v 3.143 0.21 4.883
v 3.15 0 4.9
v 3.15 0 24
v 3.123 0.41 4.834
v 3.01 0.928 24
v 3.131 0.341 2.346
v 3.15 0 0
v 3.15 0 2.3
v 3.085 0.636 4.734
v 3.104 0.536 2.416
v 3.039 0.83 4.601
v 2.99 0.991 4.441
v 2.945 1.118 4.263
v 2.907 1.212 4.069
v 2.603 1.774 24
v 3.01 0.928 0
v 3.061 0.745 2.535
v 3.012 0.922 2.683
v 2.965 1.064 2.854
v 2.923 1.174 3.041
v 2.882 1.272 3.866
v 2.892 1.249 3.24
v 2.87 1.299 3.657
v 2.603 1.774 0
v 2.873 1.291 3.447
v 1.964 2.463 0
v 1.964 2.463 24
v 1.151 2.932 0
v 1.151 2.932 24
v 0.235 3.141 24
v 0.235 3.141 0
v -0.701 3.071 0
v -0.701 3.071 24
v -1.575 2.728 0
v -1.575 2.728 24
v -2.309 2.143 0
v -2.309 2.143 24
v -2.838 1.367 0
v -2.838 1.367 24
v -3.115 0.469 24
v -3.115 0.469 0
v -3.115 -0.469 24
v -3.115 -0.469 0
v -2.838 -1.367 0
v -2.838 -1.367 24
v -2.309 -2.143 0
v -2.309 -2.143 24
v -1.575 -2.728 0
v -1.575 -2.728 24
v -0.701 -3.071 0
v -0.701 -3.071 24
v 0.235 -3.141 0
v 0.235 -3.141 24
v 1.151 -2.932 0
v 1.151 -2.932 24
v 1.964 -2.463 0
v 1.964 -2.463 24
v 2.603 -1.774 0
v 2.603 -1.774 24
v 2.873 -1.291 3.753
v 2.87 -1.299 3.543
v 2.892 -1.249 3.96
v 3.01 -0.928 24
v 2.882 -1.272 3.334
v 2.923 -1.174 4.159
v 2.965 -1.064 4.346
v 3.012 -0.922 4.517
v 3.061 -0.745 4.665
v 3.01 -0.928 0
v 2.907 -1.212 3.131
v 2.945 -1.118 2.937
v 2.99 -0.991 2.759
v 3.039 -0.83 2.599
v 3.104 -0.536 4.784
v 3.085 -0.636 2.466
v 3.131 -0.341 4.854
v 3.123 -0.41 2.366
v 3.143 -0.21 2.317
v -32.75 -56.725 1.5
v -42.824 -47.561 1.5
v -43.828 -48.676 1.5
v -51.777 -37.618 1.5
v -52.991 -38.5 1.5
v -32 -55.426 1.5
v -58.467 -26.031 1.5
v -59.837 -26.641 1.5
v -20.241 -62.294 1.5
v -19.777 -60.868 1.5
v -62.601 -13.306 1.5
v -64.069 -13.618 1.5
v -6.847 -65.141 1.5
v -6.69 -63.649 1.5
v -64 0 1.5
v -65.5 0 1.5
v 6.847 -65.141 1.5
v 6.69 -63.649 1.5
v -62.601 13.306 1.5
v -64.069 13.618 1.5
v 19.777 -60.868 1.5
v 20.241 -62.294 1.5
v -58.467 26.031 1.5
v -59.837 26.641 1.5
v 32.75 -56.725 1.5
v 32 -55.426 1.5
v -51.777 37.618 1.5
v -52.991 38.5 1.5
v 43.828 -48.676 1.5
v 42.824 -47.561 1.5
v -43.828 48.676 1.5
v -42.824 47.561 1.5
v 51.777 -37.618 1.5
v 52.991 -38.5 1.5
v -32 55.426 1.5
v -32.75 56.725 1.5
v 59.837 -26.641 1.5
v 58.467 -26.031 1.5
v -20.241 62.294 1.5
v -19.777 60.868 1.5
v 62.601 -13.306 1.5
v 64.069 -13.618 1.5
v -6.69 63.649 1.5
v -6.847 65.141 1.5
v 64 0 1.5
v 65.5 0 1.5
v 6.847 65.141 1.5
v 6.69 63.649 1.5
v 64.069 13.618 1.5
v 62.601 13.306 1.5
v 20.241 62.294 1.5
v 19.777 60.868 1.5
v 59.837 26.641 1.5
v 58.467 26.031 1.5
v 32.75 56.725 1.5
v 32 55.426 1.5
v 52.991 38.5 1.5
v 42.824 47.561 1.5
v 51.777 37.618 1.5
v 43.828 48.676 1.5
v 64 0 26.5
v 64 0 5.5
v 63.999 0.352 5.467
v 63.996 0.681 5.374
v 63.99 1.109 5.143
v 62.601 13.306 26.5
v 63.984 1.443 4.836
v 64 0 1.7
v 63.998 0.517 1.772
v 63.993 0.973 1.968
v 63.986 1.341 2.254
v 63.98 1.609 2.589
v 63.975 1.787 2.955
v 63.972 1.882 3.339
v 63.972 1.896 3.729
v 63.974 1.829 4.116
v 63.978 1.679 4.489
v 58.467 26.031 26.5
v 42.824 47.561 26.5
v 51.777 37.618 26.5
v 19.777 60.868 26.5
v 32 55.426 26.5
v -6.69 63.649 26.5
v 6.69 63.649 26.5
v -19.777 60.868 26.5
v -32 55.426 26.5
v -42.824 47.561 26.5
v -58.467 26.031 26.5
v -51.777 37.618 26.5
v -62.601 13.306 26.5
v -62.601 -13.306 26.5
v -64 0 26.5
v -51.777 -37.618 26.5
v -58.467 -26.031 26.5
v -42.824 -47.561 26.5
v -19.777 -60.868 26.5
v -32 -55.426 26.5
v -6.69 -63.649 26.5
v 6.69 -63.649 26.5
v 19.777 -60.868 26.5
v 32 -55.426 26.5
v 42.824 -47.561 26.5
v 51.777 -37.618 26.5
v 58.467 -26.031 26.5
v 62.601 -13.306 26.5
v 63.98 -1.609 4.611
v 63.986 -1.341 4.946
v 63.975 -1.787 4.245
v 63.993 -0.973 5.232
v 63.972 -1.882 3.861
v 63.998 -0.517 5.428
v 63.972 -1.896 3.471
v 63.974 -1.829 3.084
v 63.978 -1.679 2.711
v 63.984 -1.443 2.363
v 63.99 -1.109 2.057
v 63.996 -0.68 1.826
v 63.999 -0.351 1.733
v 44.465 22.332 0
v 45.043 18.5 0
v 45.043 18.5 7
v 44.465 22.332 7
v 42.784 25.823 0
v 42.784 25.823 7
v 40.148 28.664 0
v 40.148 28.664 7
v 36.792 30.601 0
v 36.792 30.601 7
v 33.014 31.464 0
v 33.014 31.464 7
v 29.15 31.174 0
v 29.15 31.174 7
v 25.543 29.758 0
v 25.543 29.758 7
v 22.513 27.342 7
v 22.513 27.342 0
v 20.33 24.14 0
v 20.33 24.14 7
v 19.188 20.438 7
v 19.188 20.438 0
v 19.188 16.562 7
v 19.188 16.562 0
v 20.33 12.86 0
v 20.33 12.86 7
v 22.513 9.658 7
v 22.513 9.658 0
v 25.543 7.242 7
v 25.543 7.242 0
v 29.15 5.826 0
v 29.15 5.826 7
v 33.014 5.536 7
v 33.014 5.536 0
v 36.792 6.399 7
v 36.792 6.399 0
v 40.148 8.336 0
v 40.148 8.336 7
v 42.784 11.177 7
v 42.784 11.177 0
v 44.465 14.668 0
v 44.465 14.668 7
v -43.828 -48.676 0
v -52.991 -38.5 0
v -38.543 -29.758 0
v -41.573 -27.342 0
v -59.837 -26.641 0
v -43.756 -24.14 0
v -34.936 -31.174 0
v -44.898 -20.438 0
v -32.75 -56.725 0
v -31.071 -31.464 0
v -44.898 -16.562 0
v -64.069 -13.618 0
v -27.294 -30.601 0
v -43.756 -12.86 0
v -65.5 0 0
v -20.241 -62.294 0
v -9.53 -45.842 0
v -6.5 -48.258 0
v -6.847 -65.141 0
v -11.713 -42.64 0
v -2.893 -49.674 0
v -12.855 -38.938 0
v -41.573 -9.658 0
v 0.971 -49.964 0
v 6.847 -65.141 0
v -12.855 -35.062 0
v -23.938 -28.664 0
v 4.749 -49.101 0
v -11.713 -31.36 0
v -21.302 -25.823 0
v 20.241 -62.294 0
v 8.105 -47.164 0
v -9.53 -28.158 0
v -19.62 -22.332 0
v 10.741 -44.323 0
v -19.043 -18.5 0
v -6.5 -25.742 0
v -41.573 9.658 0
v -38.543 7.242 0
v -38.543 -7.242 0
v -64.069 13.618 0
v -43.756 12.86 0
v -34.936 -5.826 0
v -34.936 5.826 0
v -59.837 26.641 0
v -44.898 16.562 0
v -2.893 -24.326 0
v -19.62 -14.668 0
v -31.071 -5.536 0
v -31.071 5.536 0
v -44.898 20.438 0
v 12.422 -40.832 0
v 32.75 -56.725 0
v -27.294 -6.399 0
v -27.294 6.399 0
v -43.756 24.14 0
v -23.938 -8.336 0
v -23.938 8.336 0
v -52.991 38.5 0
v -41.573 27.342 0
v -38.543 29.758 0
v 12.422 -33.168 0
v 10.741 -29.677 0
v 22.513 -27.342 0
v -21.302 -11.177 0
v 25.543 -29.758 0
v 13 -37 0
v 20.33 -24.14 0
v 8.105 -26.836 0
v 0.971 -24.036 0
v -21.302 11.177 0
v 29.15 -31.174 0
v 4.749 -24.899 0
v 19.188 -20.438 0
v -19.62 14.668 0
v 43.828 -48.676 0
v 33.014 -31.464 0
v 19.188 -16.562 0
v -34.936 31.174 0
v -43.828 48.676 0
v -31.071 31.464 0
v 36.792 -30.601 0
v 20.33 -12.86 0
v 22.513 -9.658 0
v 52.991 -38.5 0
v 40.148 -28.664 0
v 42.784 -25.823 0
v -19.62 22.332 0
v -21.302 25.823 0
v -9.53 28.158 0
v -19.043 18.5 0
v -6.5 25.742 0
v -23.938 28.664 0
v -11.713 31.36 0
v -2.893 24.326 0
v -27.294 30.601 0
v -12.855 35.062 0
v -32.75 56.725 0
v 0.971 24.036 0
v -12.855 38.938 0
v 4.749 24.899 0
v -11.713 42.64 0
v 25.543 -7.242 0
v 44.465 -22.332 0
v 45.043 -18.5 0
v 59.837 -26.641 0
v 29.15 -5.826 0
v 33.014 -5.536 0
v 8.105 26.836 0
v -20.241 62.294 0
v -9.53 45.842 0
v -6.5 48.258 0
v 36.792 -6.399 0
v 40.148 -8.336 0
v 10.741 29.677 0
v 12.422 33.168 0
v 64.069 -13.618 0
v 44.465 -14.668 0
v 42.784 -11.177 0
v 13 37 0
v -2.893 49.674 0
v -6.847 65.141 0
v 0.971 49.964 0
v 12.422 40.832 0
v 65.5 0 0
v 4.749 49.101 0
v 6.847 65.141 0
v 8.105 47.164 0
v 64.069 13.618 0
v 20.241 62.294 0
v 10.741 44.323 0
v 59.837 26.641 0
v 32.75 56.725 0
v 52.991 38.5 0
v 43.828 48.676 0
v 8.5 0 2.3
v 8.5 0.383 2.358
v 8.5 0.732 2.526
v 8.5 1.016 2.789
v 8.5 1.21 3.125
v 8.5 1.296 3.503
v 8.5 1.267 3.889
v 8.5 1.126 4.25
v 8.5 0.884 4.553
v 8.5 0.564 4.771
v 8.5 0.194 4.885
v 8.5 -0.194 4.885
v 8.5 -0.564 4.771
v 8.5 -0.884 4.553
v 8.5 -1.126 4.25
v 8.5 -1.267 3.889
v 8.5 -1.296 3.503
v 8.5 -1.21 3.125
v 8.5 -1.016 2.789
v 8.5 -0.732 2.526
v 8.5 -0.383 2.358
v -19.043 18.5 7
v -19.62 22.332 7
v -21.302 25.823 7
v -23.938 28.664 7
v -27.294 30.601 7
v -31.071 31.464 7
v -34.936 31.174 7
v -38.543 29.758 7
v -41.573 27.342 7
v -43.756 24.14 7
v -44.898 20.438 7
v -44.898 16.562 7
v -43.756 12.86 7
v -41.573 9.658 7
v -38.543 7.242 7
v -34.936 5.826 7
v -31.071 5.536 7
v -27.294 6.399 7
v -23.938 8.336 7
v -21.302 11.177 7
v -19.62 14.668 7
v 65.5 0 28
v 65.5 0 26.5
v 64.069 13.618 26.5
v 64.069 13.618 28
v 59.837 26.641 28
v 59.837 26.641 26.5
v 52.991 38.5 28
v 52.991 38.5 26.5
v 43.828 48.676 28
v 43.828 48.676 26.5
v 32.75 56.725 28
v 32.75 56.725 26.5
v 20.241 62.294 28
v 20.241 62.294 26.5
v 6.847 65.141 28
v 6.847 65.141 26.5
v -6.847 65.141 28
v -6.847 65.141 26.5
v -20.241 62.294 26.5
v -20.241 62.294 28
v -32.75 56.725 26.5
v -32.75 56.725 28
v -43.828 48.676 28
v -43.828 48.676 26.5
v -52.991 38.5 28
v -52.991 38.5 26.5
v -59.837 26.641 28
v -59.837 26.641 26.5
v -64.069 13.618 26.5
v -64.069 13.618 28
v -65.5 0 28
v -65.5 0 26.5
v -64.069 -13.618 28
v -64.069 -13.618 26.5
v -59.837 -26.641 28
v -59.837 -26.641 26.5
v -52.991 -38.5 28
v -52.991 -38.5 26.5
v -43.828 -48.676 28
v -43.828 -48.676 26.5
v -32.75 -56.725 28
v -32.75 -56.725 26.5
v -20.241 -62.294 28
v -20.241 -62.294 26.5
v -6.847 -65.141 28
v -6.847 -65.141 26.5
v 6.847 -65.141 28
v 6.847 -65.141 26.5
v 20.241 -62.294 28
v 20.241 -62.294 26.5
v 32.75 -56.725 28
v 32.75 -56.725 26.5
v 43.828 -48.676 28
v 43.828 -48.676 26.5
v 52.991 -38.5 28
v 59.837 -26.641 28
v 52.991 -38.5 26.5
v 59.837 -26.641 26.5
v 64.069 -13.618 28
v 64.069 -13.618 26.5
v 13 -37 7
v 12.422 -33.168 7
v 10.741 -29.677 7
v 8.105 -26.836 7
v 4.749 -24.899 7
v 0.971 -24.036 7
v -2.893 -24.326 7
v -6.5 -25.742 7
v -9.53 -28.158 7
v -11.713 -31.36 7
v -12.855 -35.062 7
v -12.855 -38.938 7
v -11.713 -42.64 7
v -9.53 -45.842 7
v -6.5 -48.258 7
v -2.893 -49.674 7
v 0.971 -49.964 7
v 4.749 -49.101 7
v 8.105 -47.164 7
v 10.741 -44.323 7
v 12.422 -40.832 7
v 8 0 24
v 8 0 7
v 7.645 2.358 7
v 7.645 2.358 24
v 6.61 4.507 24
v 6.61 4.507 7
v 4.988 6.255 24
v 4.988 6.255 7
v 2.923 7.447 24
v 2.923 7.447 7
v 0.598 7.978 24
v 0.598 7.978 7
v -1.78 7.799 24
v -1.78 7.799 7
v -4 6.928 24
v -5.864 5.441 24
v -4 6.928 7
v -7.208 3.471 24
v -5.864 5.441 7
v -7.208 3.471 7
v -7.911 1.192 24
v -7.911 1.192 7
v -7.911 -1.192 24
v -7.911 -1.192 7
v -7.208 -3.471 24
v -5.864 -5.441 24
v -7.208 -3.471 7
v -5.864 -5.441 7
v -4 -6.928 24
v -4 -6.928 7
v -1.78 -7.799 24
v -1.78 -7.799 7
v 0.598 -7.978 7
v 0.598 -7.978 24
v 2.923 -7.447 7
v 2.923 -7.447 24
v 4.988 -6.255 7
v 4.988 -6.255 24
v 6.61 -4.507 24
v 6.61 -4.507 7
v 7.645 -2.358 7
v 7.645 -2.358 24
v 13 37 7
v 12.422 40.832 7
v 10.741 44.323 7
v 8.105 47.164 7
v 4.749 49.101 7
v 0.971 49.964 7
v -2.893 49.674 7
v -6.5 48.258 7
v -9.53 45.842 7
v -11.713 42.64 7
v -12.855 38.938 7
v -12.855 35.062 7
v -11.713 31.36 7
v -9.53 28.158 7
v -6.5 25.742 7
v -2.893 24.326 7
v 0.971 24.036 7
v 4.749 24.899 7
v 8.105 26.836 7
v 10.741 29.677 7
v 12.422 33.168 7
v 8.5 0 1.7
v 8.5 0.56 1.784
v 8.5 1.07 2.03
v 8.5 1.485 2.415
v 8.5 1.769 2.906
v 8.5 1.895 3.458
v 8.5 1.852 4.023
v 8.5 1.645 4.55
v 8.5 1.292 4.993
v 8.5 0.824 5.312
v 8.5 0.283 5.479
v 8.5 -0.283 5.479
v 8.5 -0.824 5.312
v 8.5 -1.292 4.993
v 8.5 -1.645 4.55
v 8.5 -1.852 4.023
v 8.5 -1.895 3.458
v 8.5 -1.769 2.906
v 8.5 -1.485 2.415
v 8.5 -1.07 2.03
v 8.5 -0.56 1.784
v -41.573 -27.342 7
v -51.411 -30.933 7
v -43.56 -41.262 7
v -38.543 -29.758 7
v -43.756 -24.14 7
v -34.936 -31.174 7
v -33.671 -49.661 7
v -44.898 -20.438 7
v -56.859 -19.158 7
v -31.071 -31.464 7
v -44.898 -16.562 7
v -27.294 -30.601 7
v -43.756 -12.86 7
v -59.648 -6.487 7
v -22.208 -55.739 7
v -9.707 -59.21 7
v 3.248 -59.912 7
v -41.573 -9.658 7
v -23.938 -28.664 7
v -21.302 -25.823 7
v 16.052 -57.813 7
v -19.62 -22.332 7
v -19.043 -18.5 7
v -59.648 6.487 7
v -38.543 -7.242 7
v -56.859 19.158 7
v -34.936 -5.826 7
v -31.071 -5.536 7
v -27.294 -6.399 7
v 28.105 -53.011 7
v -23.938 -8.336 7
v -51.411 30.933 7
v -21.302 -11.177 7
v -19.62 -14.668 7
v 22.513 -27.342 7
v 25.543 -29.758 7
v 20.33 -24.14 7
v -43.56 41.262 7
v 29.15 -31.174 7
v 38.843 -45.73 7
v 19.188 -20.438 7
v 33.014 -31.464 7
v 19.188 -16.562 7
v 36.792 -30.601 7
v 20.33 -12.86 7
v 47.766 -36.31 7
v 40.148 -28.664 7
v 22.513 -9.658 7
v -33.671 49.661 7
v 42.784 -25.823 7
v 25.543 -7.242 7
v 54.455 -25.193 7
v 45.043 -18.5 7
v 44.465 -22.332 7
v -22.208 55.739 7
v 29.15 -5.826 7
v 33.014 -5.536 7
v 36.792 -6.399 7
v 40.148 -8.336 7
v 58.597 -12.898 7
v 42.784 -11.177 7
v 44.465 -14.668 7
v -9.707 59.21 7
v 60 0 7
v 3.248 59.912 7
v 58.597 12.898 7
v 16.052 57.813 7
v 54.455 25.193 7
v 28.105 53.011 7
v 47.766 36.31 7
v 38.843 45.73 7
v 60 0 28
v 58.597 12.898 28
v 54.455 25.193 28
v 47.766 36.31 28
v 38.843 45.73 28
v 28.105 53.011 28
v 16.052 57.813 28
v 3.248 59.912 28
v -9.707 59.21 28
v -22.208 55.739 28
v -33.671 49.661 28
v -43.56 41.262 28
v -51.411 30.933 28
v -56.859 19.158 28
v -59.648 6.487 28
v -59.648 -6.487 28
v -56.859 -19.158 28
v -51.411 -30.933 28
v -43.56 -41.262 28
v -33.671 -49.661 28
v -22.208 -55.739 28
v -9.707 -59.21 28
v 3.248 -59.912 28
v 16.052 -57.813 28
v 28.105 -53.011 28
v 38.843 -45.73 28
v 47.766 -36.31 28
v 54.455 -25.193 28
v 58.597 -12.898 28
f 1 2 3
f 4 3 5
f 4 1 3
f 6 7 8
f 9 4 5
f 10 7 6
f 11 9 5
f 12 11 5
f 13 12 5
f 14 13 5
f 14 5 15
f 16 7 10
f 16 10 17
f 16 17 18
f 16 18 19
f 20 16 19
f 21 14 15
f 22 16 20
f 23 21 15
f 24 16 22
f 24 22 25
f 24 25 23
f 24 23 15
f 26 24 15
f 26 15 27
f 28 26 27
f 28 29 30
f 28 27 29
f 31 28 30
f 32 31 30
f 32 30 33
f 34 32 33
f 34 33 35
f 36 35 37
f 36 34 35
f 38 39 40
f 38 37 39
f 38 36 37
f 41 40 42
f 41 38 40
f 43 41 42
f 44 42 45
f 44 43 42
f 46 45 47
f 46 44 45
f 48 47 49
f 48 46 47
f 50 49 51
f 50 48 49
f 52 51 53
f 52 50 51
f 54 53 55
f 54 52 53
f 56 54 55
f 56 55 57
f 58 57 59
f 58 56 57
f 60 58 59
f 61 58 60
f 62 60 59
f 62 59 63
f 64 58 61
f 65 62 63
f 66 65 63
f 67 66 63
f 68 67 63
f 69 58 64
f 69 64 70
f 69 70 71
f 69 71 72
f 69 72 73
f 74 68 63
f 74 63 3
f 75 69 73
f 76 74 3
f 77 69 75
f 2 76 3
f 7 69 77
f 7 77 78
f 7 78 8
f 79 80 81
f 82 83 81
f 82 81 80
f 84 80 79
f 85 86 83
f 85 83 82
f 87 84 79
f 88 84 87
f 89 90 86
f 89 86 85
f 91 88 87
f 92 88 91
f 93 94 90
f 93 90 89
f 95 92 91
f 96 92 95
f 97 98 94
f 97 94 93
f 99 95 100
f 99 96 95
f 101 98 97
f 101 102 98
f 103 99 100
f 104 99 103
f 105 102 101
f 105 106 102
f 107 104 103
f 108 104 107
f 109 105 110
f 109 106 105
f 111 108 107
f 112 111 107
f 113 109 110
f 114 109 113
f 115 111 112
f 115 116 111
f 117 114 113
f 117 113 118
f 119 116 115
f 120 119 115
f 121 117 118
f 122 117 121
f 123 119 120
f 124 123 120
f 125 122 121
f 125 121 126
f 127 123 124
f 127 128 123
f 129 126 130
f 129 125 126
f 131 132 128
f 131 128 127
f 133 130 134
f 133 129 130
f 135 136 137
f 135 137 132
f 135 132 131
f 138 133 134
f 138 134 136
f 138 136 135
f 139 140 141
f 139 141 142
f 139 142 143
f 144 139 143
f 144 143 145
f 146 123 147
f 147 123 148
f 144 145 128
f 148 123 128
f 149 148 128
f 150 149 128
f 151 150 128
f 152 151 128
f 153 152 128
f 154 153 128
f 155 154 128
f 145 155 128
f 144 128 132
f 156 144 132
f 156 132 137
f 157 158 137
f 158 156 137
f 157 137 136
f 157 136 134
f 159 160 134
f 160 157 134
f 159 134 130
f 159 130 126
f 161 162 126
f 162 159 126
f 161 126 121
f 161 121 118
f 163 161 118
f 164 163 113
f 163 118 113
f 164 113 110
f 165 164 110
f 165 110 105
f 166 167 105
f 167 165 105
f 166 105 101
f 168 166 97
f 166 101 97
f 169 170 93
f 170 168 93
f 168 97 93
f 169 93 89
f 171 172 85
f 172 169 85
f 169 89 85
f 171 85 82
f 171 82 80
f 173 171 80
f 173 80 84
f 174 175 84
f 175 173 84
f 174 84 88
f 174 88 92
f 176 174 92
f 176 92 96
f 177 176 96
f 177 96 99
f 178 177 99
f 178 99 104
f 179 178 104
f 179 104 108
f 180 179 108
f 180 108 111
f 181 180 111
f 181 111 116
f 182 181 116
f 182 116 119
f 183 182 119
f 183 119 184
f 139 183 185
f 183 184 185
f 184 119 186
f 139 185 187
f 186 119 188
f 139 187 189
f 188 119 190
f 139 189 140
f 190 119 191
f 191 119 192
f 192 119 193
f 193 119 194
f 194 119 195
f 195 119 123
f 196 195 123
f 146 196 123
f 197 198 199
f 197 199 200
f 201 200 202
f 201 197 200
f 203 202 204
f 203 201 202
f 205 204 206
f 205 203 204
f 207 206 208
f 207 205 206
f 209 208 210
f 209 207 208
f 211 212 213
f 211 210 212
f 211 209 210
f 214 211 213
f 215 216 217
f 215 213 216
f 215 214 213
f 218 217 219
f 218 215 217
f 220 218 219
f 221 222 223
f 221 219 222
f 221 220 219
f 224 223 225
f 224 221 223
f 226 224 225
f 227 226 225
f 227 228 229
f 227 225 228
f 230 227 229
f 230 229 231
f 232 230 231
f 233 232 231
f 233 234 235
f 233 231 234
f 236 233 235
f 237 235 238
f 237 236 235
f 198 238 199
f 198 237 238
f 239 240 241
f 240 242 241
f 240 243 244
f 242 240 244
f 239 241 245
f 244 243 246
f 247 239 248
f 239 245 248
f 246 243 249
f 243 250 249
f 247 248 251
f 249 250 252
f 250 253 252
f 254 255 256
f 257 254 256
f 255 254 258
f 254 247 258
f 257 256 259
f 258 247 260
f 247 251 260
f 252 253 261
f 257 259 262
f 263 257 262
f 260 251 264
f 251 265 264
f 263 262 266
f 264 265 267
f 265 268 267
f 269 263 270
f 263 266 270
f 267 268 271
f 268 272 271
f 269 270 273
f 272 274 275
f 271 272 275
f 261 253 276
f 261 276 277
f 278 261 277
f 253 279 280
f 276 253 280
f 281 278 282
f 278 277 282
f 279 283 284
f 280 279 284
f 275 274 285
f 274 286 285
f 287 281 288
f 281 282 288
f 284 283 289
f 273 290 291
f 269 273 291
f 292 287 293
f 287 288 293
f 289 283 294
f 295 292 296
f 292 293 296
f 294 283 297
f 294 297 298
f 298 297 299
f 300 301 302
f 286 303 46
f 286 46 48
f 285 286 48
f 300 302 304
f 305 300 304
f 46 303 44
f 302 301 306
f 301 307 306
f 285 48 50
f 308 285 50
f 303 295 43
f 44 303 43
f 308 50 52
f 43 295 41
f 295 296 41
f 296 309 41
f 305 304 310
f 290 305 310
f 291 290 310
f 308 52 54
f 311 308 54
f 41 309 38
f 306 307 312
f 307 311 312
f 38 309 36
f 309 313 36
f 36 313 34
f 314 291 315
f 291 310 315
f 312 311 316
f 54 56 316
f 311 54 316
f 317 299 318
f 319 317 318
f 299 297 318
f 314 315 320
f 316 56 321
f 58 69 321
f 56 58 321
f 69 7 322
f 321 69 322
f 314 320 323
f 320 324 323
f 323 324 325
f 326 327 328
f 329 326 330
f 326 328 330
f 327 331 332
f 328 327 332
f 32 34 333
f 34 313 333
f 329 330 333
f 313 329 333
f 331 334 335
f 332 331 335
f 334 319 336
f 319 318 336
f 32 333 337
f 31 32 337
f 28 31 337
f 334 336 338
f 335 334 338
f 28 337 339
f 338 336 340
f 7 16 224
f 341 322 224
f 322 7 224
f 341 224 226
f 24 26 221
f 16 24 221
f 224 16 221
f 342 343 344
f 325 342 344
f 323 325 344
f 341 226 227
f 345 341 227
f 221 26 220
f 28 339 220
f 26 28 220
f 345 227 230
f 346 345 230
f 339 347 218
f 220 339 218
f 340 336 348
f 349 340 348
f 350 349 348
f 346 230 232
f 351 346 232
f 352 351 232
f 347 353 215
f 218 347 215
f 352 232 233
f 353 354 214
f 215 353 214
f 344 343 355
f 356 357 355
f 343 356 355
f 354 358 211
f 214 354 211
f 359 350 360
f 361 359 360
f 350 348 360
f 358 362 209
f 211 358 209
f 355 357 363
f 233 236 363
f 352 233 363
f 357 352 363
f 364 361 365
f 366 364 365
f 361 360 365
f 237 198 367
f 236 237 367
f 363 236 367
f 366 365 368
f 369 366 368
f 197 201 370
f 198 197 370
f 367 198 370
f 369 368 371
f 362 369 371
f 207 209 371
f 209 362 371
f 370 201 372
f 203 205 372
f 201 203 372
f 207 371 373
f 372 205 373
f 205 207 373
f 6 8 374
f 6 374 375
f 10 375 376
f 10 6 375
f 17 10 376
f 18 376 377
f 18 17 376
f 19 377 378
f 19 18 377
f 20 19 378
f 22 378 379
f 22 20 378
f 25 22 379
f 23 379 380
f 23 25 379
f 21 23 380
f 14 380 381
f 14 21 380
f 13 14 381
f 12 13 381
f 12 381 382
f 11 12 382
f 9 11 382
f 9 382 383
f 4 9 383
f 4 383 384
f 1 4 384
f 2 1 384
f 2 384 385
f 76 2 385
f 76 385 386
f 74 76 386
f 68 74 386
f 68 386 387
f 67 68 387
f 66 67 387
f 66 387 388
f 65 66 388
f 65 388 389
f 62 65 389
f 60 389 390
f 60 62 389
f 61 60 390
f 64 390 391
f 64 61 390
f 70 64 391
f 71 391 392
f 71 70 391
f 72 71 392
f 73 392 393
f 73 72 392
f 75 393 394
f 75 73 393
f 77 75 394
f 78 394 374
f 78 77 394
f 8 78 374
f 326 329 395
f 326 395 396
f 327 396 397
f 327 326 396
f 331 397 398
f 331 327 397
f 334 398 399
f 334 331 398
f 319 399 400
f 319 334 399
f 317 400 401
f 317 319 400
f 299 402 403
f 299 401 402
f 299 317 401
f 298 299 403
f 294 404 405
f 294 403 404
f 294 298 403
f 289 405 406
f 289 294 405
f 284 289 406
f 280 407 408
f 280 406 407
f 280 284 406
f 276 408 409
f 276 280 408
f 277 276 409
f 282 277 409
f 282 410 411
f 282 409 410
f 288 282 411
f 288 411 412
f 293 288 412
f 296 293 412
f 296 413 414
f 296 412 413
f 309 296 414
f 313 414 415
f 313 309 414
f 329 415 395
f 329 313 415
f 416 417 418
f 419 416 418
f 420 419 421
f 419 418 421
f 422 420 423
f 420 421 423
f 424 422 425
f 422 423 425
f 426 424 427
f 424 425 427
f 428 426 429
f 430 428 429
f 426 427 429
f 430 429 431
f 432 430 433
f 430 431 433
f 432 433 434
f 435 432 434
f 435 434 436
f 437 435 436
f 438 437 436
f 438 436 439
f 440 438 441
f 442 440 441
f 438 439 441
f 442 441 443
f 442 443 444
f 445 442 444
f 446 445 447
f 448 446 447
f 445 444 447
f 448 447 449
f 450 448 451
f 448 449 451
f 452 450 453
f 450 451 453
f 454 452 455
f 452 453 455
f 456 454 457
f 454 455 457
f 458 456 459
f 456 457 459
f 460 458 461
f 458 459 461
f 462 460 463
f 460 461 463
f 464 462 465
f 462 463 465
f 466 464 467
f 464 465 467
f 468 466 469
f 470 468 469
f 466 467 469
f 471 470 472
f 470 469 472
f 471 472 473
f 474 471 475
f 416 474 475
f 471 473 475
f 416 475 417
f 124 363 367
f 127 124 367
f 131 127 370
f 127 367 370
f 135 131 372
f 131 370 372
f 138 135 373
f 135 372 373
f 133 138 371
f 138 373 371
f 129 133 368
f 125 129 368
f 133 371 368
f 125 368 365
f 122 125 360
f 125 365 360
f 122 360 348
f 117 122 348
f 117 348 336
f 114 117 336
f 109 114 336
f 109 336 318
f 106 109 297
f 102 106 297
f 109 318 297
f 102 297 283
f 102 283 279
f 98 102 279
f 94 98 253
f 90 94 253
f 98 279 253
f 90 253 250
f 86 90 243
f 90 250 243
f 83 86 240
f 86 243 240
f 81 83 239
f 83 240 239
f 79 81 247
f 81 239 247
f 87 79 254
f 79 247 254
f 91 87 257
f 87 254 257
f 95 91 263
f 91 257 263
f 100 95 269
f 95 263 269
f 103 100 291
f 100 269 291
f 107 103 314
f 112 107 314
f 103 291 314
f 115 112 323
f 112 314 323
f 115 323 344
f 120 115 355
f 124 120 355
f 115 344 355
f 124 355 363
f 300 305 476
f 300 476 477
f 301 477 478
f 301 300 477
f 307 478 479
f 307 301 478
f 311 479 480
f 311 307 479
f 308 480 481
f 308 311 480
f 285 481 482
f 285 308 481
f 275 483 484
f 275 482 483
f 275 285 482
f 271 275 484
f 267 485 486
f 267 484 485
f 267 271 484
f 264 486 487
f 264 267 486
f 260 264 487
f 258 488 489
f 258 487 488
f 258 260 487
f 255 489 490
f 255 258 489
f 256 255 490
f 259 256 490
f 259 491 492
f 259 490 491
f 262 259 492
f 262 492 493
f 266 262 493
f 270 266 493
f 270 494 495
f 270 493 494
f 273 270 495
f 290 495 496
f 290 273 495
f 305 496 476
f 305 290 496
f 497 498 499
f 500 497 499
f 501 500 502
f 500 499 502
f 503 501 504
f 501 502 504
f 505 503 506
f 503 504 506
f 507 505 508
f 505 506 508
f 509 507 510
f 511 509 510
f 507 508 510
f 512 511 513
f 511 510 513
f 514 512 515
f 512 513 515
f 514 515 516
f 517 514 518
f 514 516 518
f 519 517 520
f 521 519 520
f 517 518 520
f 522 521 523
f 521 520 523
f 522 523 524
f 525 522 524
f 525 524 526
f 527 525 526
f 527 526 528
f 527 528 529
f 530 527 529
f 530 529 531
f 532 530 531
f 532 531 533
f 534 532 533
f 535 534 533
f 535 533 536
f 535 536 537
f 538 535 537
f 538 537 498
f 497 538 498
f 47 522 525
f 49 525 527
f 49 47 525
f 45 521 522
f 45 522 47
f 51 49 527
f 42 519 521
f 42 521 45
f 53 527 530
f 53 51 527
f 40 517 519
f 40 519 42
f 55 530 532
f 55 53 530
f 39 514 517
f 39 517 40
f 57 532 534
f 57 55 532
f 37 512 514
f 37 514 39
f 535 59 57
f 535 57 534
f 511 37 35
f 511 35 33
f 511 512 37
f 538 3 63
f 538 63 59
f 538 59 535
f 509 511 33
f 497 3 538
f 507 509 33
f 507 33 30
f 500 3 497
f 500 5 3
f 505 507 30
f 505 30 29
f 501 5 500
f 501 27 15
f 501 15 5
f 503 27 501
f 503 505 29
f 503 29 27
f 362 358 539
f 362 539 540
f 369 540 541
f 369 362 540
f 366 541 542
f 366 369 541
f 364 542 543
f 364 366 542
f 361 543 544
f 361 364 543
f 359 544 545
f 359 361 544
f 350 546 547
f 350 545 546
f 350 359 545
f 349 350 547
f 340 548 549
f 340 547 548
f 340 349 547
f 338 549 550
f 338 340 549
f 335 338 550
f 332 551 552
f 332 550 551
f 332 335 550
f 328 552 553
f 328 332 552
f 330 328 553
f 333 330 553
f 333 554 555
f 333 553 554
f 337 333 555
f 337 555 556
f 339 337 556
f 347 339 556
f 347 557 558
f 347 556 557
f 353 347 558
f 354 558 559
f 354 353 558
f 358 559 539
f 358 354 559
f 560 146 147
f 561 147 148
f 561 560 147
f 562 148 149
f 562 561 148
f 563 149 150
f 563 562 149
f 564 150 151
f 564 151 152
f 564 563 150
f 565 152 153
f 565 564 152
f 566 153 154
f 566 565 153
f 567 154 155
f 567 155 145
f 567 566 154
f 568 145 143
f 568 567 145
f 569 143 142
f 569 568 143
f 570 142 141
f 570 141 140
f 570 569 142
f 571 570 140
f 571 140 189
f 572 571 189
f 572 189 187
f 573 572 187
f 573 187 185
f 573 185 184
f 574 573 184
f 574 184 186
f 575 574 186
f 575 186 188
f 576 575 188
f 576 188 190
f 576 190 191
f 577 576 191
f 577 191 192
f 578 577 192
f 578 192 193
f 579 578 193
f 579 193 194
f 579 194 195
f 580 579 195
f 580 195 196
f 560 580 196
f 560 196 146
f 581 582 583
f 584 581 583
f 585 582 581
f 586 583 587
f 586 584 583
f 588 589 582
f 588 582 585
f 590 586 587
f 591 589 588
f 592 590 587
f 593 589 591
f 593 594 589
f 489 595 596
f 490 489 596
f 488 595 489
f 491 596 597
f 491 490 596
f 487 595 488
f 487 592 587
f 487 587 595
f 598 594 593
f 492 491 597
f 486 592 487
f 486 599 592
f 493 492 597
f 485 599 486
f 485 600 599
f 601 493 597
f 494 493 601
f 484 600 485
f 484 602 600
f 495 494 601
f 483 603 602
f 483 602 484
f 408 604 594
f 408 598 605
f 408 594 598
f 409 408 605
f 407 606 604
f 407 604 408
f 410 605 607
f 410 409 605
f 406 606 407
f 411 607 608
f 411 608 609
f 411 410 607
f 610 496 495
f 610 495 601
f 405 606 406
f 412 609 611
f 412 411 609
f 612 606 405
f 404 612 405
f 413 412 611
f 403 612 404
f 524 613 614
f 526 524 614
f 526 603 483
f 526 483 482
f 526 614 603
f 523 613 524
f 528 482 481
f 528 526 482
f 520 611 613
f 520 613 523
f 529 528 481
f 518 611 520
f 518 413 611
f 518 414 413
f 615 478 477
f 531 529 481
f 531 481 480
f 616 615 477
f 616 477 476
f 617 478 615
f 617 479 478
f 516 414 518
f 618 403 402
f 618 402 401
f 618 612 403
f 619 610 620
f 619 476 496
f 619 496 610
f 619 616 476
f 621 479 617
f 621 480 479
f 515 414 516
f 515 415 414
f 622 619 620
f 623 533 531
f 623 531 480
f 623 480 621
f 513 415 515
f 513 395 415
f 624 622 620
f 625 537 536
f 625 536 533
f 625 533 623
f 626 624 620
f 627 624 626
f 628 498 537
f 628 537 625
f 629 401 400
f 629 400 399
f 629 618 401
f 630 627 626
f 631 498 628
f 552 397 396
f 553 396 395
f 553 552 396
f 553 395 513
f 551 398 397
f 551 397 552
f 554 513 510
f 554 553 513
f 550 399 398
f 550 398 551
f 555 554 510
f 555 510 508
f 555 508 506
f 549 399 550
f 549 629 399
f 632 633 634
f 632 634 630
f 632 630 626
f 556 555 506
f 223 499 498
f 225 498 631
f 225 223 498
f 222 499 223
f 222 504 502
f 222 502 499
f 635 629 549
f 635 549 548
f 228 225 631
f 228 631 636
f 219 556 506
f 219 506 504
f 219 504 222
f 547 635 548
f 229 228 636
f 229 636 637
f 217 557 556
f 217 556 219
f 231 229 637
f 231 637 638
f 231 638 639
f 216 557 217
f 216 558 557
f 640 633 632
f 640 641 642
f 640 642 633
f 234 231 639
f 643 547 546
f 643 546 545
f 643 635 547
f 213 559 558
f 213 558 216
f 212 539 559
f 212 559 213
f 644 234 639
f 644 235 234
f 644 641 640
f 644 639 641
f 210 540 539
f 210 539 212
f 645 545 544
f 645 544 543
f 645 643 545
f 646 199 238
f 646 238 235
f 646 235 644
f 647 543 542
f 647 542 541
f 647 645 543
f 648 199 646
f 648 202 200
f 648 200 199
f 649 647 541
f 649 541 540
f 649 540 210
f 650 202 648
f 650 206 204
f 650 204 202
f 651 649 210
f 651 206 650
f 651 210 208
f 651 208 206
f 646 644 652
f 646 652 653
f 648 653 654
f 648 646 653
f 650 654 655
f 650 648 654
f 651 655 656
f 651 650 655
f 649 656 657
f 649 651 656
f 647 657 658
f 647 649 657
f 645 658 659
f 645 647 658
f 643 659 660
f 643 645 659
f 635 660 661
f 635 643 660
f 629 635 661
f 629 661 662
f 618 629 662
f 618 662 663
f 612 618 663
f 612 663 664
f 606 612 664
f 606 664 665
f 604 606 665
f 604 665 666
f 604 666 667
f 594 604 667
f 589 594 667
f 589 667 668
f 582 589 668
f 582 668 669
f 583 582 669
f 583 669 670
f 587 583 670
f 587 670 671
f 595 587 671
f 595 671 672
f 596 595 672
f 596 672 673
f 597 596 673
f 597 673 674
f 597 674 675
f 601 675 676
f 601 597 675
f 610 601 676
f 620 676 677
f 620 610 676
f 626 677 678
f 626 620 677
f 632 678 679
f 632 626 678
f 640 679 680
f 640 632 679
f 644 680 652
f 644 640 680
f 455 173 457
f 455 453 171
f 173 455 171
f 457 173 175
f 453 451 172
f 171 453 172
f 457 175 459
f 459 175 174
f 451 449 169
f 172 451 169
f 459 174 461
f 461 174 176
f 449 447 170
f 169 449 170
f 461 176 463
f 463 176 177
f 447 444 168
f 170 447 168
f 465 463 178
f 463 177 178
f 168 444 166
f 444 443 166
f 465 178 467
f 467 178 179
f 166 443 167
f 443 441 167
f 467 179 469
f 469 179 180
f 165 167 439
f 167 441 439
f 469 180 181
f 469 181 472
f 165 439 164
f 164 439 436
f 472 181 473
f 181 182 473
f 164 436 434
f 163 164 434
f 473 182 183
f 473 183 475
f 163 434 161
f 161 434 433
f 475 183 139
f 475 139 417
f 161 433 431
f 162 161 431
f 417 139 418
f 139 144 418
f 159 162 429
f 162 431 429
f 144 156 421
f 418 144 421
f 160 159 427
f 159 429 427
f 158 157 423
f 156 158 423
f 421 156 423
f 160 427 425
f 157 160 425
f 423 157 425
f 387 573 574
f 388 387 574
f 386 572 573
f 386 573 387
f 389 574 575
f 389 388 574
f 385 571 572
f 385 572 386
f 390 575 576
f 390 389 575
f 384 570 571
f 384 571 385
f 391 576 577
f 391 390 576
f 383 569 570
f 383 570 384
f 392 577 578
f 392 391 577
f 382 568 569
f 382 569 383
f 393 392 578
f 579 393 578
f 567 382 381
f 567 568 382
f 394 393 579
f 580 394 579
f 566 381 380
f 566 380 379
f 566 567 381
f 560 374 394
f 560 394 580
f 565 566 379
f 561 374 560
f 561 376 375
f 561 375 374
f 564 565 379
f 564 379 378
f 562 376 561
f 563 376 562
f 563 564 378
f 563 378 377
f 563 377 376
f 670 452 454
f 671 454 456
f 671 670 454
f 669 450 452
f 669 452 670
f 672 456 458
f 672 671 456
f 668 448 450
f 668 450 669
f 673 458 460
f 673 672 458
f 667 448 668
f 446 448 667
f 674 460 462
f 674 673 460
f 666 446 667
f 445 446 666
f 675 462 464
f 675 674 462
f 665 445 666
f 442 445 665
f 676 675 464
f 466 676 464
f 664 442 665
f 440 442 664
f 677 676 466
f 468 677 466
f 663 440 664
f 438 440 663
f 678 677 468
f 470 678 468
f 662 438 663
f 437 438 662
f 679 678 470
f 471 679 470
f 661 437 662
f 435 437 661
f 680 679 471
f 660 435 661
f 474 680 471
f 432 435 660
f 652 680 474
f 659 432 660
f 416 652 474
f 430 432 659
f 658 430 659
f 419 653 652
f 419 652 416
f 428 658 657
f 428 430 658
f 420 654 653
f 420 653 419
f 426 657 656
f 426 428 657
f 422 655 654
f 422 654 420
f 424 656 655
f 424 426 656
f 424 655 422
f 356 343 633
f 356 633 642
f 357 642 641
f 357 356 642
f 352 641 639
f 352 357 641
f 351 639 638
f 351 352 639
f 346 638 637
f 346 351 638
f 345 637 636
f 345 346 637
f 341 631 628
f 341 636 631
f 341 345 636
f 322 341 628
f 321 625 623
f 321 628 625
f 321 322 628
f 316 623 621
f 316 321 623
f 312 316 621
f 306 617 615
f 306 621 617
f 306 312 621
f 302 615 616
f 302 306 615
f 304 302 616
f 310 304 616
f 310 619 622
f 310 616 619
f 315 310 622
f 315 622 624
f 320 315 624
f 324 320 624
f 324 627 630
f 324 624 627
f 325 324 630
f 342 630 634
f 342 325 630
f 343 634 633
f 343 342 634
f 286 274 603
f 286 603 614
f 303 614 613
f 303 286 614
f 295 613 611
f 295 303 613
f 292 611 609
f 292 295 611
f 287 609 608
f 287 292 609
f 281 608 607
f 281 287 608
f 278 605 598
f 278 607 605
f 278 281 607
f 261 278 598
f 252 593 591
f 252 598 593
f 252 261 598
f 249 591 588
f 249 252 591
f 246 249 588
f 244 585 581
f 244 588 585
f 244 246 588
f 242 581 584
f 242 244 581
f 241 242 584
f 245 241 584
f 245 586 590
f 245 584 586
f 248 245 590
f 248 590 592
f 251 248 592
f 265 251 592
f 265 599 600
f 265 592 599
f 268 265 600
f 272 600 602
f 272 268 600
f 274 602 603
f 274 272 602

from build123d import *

# Parameters (mm, degrees)
SKETCH1_R              = 64
SKETCH1_R_2            = 60
RIM_DEPTH              = 28
SKETCH2_R              = 65.5
SKETCH2_R_2            = 63
INNER_BEAD_LIP_DEPTH   = 1.5
SKETCH3_R              = 65.5
SKETCH3_R_2            = 63
OUTER_BEAD_LIP_DEPTH   = 1.5
SKETCH4_R              = 61
WEB_DEPTH              = 7
SKETCH5_R              = 8
HUB_BOSS_DEPTH         = 24
SKETCH6_R              = 13
LIGHTENING_HOLES_DEPTH = 9
SKETCH7_R              = 3.15
ROUND_BORE_6MM_DEPTH   = 30
SKETCH8_R              = 1.3
GRUB_SCREW_M3_DEPTH    = 9
SKETCH9_R              = 1.9
GRUB_KEY_ACCESS_DEPTH  = 57.5


with BuildPart() as part:
    # Sketch1 → Rim (new body)
    with BuildSketch(Plane.XY):
        Circle(SKETCH1_R)
        Circle(SKETCH1_R_2, mode=Mode.SUBTRACT)
    extrude(amount=RIM_DEPTH)

    # Sketch2 → Inner_bead_lip (add)
    with BuildSketch(Plane.XY):
        Circle(SKETCH2_R)
        Circle(SKETCH2_R_2, mode=Mode.SUBTRACT)
    extrude(amount=INNER_BEAD_LIP_DEPTH)

    # Sketch3 → Outer_bead_lip (add)
    with BuildSketch(Plane.XY.offset(26.5)):
        Circle(SKETCH3_R)
        Circle(SKETCH3_R_2, mode=Mode.SUBTRACT)
    extrude(amount=OUTER_BEAD_LIP_DEPTH)

    # Sketch4 → Web (add)
    with BuildSketch(Plane.XY):
        Circle(SKETCH4_R)
    extrude(amount=WEB_DEPTH)

    # Sketch5 → Hub_boss (add)
    with BuildSketch(Plane.XY):
        Circle(SKETCH5_R)
    extrude(amount=HUB_BOSS_DEPTH)

    # Sketch6 → Lightening_holes (cut)
    with BuildSketch(Plane.XY.offset(-1)):
        with Locations((32.04293994, 18.5)):
            Circle(SKETCH6_R)
        with Locations((0, 37)):
            Circle(SKETCH6_R)
        with Locations((-32.04293994, 18.5)):
            Circle(SKETCH6_R)
        with Locations((-32.04293994, -18.5)):
            Circle(SKETCH6_R)
        with Locations((0, -37)):
            Circle(SKETCH6_R)
        with Locations((32.04293994, -18.5)):
            Circle(SKETCH6_R)
    extrude(amount=LIGHTENING_HOLES_DEPTH, mode=Mode.SUBTRACT)

    # Sketch7 → Round_bore_6mm (cut)
    with BuildSketch(Plane.XY.offset(-1)):
        Circle(SKETCH7_R)
    extrude(amount=ROUND_BORE_6MM_DEPTH, mode=Mode.SUBTRACT)

    # Sketch8 → Grub_screw_M3 (cut)
    with BuildSketch(Plane(origin=(0, 0, 0), x_dir=(0, 0, -1), z_dir=(1, 0, 0))):
        with Locations((-3.6, 0)):
            Circle(SKETCH8_R)
    extrude(amount=GRUB_SCREW_M3_DEPTH, mode=Mode.SUBTRACT)

    # Sketch9 → Grub_key_access (cut)
    with BuildSketch(Plane(origin=(8.5, 0, 0), x_dir=(0, 0, -1), z_dir=(1, 0, 0))):
        with Locations((-3.6, 0)):
            Circle(SKETCH9_R)
    extrude(amount=GRUB_KEY_ACCESS_DEPTH, mode=Mode.SUBTRACT)


solid = part.part
